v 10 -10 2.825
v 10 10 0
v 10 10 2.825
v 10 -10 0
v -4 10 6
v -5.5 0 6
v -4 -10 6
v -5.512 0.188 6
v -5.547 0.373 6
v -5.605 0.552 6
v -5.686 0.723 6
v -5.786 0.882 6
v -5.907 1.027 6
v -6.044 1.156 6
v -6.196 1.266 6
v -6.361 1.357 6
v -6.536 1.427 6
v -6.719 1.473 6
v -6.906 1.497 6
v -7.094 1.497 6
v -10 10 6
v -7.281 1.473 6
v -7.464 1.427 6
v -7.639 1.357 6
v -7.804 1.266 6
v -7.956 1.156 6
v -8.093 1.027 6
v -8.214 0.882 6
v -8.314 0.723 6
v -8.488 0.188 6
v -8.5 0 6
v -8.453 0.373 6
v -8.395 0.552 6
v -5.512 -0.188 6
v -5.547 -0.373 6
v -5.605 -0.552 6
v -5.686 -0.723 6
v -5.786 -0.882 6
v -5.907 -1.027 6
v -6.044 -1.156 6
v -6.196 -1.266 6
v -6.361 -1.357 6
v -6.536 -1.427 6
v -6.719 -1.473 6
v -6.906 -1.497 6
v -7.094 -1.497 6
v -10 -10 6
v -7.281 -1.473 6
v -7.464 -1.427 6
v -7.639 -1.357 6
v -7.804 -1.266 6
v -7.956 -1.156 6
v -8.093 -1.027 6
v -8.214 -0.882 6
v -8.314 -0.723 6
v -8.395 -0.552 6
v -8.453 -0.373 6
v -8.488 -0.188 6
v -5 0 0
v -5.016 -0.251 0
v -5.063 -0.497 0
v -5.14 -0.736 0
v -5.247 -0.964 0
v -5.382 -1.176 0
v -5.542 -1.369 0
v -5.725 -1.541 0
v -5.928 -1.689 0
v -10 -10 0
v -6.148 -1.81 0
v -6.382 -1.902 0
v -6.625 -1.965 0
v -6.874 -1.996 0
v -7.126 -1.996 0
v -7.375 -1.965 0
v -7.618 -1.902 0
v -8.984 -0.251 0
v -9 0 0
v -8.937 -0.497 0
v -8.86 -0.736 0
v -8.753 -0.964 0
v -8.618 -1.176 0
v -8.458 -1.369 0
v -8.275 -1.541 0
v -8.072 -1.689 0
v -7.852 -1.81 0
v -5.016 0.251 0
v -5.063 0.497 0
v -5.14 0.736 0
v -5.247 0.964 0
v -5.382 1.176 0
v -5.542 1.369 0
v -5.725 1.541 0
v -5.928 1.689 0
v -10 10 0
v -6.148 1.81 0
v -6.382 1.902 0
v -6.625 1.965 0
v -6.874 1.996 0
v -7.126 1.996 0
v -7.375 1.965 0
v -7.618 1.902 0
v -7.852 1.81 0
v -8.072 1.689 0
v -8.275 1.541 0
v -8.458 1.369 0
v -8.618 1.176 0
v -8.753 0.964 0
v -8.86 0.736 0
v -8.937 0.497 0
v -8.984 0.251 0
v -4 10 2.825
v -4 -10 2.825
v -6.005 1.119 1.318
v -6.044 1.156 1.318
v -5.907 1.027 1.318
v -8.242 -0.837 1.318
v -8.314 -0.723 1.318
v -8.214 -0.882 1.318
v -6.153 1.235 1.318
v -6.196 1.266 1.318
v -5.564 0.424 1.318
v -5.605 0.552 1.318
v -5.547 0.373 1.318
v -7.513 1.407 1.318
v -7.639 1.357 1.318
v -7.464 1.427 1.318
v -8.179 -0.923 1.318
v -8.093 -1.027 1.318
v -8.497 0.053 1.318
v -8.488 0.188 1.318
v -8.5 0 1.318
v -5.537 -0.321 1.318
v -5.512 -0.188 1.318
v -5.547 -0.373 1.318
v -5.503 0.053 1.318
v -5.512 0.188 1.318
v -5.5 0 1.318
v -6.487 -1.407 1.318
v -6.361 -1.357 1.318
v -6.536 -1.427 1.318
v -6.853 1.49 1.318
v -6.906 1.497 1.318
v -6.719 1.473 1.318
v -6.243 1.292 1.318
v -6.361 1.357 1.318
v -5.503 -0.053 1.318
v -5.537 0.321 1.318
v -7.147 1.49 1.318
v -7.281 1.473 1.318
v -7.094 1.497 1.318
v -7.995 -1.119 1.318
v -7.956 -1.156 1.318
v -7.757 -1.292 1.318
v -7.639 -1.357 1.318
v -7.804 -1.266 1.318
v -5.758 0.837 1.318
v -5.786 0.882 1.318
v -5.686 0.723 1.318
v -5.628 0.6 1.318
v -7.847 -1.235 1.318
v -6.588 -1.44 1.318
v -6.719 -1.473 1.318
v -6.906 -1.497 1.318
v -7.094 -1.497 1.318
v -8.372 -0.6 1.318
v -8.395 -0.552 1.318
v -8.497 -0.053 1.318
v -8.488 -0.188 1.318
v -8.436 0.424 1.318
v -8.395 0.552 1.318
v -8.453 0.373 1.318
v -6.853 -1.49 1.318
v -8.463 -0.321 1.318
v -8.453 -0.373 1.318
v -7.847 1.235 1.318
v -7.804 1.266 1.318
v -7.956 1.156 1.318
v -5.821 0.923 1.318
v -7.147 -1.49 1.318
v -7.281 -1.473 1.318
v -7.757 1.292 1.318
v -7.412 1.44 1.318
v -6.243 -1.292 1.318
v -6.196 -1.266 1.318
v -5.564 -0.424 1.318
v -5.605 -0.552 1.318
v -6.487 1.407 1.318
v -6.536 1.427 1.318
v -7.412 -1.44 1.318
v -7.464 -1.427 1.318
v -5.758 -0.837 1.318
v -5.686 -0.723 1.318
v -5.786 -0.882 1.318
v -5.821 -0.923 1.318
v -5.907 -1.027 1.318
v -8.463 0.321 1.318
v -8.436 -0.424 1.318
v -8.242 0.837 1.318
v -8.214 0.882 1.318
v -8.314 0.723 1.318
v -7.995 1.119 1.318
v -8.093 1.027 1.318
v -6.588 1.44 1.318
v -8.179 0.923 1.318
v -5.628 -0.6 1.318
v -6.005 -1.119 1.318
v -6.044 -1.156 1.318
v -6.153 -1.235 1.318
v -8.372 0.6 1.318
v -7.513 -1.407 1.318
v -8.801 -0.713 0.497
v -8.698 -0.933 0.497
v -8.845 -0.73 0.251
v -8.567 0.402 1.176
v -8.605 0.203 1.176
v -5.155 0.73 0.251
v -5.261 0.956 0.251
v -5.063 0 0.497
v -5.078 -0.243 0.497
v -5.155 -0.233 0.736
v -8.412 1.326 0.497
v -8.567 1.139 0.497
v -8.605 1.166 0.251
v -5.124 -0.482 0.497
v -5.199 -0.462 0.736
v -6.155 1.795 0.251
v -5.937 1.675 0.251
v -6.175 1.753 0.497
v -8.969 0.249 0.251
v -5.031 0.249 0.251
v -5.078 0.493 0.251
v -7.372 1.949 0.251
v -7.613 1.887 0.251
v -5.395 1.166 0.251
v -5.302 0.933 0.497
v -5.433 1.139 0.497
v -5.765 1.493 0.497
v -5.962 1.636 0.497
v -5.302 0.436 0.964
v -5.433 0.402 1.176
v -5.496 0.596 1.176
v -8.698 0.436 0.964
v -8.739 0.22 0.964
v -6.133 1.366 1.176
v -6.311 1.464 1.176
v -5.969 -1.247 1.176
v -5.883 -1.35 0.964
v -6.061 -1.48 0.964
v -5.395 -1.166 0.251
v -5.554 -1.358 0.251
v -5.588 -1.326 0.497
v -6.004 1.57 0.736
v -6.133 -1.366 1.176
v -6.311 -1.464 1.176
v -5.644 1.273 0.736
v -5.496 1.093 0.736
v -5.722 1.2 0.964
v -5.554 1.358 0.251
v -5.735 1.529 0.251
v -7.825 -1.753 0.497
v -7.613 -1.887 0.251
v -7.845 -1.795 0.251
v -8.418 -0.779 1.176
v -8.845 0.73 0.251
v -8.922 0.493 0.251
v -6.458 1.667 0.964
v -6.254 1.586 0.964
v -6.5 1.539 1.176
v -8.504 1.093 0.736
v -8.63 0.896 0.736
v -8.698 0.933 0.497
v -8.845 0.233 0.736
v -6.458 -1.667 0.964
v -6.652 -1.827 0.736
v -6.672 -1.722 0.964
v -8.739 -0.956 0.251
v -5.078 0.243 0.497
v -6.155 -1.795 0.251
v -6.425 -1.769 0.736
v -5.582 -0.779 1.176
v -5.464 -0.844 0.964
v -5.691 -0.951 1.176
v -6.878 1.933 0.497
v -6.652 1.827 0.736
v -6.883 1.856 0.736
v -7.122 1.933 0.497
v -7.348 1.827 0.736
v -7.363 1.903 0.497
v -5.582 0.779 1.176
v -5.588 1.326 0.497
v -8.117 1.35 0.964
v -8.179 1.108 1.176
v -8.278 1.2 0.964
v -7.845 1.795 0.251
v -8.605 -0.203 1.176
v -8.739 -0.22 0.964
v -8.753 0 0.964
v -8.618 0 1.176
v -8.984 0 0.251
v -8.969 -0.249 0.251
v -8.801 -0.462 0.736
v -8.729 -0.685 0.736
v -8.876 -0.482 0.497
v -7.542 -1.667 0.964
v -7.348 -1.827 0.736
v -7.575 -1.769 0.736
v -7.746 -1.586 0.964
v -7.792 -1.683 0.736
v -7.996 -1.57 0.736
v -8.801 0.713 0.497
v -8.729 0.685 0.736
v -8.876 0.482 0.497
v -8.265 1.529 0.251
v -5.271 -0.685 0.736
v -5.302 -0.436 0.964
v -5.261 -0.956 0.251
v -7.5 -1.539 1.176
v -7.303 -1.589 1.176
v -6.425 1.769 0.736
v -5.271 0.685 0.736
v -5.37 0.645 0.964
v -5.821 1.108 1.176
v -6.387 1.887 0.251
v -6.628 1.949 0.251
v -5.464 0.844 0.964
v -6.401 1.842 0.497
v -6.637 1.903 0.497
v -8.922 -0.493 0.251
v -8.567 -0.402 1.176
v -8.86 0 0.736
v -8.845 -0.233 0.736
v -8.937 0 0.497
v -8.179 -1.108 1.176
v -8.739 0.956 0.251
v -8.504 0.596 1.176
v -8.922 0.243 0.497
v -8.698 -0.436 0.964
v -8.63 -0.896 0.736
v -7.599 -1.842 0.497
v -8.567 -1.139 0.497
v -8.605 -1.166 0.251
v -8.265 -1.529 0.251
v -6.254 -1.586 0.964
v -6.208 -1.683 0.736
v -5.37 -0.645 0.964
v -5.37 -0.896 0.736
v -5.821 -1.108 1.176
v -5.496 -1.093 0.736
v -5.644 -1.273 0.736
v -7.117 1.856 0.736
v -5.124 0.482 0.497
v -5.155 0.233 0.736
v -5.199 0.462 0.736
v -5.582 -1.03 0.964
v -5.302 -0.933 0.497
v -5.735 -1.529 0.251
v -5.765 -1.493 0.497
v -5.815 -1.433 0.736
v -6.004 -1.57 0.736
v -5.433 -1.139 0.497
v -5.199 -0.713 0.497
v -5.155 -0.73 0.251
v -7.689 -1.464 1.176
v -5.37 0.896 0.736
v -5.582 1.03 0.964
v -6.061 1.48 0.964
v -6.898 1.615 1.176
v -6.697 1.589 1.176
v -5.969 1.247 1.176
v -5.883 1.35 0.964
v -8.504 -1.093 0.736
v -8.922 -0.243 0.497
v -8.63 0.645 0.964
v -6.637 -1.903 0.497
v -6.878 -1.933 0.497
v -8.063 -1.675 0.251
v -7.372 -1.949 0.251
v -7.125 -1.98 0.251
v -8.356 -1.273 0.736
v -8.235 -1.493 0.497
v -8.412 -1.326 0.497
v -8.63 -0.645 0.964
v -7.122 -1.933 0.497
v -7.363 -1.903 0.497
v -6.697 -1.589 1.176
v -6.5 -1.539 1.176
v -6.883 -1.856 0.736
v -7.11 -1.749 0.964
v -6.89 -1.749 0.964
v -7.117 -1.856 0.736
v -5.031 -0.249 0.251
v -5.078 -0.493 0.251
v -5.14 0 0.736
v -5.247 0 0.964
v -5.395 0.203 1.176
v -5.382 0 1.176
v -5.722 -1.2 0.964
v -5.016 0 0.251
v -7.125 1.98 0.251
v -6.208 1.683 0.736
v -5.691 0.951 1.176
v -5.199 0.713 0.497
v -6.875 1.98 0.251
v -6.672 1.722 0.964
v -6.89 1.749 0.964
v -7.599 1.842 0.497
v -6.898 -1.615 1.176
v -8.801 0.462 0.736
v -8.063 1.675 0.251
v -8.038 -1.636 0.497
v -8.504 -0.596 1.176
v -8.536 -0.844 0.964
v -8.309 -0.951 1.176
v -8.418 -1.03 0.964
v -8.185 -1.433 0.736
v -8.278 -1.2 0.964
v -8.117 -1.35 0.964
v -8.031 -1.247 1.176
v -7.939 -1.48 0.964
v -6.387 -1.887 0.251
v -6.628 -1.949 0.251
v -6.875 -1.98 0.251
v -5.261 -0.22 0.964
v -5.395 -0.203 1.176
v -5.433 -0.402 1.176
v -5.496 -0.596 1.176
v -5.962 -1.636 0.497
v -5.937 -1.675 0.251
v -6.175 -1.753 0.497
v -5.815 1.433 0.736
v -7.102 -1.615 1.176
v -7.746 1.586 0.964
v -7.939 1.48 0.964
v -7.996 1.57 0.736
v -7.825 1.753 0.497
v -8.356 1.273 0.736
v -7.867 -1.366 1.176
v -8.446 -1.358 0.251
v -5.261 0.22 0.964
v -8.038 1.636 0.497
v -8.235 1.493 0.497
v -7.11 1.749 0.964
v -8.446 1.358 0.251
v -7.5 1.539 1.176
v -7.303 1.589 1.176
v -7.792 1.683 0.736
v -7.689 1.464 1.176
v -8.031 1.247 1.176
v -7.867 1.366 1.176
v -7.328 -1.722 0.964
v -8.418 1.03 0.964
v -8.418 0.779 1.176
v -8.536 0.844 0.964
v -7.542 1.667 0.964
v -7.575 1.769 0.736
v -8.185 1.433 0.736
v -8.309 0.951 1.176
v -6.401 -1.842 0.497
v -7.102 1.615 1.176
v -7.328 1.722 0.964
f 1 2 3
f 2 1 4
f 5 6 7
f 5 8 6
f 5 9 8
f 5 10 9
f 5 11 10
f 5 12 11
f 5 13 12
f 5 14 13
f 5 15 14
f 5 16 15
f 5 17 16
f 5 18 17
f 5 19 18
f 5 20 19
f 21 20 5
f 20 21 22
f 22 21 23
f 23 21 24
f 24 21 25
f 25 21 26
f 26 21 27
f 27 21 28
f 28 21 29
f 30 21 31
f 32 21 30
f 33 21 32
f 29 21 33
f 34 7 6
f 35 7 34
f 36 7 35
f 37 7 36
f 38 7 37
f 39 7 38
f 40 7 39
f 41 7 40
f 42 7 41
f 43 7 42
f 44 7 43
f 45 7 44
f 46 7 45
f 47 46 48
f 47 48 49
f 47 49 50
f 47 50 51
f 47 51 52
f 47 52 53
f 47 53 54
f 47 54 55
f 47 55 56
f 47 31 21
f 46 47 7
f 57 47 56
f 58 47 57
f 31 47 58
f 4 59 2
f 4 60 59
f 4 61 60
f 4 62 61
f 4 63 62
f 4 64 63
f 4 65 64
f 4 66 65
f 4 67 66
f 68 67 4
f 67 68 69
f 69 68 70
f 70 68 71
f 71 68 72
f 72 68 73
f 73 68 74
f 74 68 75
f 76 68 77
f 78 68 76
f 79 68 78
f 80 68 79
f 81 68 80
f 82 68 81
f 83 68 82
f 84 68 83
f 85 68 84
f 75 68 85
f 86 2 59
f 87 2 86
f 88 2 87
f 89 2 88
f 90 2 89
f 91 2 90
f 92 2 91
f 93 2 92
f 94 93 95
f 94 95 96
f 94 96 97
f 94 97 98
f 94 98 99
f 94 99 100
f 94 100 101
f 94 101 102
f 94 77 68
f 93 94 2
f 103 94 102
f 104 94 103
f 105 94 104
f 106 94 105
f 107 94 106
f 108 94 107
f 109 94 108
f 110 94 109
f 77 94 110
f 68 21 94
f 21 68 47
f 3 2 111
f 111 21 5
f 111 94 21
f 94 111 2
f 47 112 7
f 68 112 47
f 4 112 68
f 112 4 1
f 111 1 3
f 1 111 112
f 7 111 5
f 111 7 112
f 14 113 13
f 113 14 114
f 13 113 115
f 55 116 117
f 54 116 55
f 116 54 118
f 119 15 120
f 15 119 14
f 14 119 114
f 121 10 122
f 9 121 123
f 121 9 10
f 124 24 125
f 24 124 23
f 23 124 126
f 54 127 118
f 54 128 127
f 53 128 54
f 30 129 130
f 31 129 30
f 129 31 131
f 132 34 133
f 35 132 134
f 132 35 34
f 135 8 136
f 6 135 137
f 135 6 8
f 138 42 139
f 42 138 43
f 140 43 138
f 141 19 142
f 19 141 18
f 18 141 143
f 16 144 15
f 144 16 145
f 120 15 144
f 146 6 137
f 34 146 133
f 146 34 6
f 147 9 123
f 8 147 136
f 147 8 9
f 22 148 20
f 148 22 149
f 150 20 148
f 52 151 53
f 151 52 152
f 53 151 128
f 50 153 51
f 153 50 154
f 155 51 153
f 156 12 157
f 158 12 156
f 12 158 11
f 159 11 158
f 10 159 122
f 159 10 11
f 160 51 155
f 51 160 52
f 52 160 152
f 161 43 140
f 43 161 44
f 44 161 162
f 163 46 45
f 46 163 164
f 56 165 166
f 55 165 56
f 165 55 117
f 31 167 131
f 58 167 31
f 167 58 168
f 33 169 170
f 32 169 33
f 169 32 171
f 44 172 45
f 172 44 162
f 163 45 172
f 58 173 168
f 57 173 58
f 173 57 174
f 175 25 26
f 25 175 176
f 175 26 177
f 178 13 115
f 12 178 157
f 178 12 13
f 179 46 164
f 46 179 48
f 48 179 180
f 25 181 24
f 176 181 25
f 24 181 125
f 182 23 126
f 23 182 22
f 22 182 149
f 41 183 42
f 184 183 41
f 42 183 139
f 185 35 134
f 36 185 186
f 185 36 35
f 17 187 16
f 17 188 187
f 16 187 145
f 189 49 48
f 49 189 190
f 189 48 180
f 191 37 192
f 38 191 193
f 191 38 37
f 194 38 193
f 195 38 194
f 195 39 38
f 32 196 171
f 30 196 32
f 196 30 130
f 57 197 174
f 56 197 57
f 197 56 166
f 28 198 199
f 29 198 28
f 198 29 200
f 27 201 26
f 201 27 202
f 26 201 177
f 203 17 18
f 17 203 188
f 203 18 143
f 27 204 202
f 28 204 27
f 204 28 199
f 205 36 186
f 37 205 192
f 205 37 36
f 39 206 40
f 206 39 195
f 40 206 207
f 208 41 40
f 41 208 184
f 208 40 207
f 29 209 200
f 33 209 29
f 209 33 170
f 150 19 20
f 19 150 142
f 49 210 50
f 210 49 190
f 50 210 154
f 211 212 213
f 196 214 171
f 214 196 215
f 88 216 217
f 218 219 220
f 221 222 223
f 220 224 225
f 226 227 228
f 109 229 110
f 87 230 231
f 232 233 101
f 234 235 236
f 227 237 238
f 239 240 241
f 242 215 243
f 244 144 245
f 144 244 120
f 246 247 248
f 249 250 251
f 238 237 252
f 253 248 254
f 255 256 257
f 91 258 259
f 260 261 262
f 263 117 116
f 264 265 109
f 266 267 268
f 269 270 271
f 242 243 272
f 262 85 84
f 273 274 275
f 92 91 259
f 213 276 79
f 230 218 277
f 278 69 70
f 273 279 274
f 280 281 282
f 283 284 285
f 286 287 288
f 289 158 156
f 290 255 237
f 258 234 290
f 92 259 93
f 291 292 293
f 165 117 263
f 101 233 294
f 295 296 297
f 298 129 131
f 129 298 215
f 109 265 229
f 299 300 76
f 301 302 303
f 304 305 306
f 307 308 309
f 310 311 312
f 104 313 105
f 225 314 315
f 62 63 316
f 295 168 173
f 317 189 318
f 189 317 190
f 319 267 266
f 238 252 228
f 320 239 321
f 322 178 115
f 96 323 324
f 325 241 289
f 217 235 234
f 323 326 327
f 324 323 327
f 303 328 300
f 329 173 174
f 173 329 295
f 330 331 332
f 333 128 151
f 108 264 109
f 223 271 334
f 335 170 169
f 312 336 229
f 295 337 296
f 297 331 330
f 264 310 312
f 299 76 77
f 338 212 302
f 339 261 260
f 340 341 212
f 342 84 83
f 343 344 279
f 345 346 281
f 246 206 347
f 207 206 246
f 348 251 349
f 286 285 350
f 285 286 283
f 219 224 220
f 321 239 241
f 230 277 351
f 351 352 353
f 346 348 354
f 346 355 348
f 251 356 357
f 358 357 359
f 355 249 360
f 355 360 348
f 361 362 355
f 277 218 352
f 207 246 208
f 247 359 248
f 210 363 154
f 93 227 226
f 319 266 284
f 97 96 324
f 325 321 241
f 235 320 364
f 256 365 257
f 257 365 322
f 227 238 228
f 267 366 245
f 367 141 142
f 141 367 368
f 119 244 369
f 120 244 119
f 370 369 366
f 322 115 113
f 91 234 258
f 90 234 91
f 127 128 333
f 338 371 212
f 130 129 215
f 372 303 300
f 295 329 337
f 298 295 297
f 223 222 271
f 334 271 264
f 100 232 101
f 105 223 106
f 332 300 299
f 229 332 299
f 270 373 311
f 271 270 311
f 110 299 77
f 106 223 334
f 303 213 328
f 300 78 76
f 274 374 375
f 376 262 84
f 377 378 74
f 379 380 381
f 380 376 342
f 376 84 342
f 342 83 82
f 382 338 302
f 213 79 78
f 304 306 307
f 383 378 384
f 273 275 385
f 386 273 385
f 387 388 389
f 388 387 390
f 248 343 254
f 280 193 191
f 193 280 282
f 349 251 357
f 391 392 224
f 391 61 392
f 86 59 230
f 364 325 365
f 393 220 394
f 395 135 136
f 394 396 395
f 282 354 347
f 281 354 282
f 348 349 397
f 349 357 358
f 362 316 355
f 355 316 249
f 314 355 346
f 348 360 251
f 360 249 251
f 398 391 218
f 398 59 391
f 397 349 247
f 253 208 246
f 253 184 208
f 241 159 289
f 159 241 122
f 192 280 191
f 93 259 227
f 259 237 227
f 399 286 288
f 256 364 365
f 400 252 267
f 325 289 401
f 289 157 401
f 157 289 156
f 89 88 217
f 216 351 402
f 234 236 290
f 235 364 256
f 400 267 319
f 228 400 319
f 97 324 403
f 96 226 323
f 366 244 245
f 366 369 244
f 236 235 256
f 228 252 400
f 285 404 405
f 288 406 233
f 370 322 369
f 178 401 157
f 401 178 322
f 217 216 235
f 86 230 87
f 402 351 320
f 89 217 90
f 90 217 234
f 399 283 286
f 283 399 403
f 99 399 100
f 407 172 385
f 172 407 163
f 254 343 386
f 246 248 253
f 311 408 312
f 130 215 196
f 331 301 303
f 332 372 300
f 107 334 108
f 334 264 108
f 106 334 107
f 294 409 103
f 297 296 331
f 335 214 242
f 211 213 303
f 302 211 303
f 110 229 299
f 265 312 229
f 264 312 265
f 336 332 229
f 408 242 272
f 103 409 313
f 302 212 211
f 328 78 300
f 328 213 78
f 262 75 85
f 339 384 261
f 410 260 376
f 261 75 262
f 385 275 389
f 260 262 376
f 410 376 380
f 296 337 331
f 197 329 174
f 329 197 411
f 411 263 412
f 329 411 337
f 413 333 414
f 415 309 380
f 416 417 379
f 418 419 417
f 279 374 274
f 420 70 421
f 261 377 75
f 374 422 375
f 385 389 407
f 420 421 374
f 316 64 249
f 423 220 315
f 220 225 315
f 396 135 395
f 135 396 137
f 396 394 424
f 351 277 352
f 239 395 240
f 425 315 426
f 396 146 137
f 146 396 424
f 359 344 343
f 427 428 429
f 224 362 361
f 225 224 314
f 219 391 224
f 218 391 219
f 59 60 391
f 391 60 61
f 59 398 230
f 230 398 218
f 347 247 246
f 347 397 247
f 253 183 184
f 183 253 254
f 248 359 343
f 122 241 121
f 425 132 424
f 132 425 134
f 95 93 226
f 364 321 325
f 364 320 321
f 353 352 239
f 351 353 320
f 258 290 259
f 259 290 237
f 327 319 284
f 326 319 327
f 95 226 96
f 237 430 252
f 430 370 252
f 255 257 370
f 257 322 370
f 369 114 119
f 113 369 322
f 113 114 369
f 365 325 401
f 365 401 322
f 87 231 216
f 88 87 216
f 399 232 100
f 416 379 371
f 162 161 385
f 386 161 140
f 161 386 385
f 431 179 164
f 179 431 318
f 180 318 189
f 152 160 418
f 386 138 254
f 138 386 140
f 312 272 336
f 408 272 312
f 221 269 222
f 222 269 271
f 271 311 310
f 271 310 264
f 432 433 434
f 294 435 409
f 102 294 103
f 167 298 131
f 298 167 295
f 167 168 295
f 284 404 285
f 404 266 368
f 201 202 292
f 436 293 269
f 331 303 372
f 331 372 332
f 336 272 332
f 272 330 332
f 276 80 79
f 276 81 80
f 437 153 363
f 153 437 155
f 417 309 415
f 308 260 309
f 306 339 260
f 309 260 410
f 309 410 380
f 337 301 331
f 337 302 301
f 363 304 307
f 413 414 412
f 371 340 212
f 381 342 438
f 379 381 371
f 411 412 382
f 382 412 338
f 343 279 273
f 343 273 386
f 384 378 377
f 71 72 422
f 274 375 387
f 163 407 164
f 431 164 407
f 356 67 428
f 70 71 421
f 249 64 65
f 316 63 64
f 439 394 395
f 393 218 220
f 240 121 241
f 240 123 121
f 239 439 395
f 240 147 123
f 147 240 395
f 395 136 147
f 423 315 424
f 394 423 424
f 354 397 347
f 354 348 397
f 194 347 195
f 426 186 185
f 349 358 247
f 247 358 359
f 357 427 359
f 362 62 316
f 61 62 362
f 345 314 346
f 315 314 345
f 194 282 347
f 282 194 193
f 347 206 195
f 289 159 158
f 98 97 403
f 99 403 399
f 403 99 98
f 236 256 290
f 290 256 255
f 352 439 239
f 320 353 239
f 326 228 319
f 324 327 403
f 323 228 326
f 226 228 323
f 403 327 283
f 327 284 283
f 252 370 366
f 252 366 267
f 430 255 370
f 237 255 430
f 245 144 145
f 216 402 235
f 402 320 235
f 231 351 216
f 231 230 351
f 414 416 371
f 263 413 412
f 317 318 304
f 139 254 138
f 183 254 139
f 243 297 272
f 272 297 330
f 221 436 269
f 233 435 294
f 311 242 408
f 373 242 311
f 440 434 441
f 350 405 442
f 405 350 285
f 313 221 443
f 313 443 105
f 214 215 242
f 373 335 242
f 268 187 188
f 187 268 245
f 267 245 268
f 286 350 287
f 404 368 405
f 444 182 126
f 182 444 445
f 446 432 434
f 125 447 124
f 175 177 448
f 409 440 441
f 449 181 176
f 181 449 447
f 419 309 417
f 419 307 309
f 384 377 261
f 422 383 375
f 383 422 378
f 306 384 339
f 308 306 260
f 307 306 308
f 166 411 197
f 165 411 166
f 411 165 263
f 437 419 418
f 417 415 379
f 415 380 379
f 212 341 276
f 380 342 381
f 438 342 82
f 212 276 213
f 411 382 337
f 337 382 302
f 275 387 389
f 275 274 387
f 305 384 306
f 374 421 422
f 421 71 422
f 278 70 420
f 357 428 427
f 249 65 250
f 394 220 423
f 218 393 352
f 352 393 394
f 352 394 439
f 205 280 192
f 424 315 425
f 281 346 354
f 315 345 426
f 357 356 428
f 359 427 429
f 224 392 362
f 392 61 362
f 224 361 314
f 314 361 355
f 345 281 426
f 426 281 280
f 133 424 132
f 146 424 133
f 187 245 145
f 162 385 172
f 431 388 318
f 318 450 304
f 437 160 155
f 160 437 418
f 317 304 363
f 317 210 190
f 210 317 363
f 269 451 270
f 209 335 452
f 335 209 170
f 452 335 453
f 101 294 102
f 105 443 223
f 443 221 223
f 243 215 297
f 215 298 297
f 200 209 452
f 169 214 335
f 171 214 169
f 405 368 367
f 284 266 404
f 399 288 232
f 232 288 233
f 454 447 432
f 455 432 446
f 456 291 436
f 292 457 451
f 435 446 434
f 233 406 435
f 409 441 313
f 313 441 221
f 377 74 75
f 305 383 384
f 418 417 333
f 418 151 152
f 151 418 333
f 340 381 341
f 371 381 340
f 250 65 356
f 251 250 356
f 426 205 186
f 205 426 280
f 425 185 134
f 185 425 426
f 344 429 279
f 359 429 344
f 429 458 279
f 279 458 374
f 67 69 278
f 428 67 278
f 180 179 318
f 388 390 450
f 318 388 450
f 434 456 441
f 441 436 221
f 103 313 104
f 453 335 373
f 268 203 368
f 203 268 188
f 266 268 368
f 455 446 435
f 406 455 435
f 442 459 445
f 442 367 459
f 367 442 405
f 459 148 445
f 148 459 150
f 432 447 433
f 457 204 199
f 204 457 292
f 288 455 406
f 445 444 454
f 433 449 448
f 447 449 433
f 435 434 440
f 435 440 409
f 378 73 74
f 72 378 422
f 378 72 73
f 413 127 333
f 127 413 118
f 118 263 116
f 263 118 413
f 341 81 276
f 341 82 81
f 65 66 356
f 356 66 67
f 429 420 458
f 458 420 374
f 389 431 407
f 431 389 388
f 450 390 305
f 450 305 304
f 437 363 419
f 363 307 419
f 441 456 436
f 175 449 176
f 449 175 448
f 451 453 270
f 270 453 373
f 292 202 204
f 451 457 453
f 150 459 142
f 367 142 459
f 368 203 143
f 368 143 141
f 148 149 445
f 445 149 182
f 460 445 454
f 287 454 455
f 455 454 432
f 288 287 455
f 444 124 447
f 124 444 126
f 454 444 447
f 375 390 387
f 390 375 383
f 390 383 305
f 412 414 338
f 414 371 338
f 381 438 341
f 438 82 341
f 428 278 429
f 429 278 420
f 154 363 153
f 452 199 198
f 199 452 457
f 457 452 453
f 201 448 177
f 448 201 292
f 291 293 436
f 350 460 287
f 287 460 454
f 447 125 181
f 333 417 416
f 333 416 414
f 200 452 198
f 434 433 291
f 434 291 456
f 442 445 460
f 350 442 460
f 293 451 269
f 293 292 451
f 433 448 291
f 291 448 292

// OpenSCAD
thickness			=	3.175;
wall_thickness	=	6;
screw_size			=	3;
width					= 20;
height					=	20;

translate([-height/2,-width/2,0]) difference(){
	cube([height,width,wall_thickness]);
	translate([wall_thickness,-1,wall_thickness-thickness]) cube([100,100,thickness]);
	translate([screw_size,width/2,0]) cylinder(d=screw_size, h=height, $fn=50);
	#translate([screw_size,width/2,0]) sphere(d=screw_size+1,  $fn=50);
}
